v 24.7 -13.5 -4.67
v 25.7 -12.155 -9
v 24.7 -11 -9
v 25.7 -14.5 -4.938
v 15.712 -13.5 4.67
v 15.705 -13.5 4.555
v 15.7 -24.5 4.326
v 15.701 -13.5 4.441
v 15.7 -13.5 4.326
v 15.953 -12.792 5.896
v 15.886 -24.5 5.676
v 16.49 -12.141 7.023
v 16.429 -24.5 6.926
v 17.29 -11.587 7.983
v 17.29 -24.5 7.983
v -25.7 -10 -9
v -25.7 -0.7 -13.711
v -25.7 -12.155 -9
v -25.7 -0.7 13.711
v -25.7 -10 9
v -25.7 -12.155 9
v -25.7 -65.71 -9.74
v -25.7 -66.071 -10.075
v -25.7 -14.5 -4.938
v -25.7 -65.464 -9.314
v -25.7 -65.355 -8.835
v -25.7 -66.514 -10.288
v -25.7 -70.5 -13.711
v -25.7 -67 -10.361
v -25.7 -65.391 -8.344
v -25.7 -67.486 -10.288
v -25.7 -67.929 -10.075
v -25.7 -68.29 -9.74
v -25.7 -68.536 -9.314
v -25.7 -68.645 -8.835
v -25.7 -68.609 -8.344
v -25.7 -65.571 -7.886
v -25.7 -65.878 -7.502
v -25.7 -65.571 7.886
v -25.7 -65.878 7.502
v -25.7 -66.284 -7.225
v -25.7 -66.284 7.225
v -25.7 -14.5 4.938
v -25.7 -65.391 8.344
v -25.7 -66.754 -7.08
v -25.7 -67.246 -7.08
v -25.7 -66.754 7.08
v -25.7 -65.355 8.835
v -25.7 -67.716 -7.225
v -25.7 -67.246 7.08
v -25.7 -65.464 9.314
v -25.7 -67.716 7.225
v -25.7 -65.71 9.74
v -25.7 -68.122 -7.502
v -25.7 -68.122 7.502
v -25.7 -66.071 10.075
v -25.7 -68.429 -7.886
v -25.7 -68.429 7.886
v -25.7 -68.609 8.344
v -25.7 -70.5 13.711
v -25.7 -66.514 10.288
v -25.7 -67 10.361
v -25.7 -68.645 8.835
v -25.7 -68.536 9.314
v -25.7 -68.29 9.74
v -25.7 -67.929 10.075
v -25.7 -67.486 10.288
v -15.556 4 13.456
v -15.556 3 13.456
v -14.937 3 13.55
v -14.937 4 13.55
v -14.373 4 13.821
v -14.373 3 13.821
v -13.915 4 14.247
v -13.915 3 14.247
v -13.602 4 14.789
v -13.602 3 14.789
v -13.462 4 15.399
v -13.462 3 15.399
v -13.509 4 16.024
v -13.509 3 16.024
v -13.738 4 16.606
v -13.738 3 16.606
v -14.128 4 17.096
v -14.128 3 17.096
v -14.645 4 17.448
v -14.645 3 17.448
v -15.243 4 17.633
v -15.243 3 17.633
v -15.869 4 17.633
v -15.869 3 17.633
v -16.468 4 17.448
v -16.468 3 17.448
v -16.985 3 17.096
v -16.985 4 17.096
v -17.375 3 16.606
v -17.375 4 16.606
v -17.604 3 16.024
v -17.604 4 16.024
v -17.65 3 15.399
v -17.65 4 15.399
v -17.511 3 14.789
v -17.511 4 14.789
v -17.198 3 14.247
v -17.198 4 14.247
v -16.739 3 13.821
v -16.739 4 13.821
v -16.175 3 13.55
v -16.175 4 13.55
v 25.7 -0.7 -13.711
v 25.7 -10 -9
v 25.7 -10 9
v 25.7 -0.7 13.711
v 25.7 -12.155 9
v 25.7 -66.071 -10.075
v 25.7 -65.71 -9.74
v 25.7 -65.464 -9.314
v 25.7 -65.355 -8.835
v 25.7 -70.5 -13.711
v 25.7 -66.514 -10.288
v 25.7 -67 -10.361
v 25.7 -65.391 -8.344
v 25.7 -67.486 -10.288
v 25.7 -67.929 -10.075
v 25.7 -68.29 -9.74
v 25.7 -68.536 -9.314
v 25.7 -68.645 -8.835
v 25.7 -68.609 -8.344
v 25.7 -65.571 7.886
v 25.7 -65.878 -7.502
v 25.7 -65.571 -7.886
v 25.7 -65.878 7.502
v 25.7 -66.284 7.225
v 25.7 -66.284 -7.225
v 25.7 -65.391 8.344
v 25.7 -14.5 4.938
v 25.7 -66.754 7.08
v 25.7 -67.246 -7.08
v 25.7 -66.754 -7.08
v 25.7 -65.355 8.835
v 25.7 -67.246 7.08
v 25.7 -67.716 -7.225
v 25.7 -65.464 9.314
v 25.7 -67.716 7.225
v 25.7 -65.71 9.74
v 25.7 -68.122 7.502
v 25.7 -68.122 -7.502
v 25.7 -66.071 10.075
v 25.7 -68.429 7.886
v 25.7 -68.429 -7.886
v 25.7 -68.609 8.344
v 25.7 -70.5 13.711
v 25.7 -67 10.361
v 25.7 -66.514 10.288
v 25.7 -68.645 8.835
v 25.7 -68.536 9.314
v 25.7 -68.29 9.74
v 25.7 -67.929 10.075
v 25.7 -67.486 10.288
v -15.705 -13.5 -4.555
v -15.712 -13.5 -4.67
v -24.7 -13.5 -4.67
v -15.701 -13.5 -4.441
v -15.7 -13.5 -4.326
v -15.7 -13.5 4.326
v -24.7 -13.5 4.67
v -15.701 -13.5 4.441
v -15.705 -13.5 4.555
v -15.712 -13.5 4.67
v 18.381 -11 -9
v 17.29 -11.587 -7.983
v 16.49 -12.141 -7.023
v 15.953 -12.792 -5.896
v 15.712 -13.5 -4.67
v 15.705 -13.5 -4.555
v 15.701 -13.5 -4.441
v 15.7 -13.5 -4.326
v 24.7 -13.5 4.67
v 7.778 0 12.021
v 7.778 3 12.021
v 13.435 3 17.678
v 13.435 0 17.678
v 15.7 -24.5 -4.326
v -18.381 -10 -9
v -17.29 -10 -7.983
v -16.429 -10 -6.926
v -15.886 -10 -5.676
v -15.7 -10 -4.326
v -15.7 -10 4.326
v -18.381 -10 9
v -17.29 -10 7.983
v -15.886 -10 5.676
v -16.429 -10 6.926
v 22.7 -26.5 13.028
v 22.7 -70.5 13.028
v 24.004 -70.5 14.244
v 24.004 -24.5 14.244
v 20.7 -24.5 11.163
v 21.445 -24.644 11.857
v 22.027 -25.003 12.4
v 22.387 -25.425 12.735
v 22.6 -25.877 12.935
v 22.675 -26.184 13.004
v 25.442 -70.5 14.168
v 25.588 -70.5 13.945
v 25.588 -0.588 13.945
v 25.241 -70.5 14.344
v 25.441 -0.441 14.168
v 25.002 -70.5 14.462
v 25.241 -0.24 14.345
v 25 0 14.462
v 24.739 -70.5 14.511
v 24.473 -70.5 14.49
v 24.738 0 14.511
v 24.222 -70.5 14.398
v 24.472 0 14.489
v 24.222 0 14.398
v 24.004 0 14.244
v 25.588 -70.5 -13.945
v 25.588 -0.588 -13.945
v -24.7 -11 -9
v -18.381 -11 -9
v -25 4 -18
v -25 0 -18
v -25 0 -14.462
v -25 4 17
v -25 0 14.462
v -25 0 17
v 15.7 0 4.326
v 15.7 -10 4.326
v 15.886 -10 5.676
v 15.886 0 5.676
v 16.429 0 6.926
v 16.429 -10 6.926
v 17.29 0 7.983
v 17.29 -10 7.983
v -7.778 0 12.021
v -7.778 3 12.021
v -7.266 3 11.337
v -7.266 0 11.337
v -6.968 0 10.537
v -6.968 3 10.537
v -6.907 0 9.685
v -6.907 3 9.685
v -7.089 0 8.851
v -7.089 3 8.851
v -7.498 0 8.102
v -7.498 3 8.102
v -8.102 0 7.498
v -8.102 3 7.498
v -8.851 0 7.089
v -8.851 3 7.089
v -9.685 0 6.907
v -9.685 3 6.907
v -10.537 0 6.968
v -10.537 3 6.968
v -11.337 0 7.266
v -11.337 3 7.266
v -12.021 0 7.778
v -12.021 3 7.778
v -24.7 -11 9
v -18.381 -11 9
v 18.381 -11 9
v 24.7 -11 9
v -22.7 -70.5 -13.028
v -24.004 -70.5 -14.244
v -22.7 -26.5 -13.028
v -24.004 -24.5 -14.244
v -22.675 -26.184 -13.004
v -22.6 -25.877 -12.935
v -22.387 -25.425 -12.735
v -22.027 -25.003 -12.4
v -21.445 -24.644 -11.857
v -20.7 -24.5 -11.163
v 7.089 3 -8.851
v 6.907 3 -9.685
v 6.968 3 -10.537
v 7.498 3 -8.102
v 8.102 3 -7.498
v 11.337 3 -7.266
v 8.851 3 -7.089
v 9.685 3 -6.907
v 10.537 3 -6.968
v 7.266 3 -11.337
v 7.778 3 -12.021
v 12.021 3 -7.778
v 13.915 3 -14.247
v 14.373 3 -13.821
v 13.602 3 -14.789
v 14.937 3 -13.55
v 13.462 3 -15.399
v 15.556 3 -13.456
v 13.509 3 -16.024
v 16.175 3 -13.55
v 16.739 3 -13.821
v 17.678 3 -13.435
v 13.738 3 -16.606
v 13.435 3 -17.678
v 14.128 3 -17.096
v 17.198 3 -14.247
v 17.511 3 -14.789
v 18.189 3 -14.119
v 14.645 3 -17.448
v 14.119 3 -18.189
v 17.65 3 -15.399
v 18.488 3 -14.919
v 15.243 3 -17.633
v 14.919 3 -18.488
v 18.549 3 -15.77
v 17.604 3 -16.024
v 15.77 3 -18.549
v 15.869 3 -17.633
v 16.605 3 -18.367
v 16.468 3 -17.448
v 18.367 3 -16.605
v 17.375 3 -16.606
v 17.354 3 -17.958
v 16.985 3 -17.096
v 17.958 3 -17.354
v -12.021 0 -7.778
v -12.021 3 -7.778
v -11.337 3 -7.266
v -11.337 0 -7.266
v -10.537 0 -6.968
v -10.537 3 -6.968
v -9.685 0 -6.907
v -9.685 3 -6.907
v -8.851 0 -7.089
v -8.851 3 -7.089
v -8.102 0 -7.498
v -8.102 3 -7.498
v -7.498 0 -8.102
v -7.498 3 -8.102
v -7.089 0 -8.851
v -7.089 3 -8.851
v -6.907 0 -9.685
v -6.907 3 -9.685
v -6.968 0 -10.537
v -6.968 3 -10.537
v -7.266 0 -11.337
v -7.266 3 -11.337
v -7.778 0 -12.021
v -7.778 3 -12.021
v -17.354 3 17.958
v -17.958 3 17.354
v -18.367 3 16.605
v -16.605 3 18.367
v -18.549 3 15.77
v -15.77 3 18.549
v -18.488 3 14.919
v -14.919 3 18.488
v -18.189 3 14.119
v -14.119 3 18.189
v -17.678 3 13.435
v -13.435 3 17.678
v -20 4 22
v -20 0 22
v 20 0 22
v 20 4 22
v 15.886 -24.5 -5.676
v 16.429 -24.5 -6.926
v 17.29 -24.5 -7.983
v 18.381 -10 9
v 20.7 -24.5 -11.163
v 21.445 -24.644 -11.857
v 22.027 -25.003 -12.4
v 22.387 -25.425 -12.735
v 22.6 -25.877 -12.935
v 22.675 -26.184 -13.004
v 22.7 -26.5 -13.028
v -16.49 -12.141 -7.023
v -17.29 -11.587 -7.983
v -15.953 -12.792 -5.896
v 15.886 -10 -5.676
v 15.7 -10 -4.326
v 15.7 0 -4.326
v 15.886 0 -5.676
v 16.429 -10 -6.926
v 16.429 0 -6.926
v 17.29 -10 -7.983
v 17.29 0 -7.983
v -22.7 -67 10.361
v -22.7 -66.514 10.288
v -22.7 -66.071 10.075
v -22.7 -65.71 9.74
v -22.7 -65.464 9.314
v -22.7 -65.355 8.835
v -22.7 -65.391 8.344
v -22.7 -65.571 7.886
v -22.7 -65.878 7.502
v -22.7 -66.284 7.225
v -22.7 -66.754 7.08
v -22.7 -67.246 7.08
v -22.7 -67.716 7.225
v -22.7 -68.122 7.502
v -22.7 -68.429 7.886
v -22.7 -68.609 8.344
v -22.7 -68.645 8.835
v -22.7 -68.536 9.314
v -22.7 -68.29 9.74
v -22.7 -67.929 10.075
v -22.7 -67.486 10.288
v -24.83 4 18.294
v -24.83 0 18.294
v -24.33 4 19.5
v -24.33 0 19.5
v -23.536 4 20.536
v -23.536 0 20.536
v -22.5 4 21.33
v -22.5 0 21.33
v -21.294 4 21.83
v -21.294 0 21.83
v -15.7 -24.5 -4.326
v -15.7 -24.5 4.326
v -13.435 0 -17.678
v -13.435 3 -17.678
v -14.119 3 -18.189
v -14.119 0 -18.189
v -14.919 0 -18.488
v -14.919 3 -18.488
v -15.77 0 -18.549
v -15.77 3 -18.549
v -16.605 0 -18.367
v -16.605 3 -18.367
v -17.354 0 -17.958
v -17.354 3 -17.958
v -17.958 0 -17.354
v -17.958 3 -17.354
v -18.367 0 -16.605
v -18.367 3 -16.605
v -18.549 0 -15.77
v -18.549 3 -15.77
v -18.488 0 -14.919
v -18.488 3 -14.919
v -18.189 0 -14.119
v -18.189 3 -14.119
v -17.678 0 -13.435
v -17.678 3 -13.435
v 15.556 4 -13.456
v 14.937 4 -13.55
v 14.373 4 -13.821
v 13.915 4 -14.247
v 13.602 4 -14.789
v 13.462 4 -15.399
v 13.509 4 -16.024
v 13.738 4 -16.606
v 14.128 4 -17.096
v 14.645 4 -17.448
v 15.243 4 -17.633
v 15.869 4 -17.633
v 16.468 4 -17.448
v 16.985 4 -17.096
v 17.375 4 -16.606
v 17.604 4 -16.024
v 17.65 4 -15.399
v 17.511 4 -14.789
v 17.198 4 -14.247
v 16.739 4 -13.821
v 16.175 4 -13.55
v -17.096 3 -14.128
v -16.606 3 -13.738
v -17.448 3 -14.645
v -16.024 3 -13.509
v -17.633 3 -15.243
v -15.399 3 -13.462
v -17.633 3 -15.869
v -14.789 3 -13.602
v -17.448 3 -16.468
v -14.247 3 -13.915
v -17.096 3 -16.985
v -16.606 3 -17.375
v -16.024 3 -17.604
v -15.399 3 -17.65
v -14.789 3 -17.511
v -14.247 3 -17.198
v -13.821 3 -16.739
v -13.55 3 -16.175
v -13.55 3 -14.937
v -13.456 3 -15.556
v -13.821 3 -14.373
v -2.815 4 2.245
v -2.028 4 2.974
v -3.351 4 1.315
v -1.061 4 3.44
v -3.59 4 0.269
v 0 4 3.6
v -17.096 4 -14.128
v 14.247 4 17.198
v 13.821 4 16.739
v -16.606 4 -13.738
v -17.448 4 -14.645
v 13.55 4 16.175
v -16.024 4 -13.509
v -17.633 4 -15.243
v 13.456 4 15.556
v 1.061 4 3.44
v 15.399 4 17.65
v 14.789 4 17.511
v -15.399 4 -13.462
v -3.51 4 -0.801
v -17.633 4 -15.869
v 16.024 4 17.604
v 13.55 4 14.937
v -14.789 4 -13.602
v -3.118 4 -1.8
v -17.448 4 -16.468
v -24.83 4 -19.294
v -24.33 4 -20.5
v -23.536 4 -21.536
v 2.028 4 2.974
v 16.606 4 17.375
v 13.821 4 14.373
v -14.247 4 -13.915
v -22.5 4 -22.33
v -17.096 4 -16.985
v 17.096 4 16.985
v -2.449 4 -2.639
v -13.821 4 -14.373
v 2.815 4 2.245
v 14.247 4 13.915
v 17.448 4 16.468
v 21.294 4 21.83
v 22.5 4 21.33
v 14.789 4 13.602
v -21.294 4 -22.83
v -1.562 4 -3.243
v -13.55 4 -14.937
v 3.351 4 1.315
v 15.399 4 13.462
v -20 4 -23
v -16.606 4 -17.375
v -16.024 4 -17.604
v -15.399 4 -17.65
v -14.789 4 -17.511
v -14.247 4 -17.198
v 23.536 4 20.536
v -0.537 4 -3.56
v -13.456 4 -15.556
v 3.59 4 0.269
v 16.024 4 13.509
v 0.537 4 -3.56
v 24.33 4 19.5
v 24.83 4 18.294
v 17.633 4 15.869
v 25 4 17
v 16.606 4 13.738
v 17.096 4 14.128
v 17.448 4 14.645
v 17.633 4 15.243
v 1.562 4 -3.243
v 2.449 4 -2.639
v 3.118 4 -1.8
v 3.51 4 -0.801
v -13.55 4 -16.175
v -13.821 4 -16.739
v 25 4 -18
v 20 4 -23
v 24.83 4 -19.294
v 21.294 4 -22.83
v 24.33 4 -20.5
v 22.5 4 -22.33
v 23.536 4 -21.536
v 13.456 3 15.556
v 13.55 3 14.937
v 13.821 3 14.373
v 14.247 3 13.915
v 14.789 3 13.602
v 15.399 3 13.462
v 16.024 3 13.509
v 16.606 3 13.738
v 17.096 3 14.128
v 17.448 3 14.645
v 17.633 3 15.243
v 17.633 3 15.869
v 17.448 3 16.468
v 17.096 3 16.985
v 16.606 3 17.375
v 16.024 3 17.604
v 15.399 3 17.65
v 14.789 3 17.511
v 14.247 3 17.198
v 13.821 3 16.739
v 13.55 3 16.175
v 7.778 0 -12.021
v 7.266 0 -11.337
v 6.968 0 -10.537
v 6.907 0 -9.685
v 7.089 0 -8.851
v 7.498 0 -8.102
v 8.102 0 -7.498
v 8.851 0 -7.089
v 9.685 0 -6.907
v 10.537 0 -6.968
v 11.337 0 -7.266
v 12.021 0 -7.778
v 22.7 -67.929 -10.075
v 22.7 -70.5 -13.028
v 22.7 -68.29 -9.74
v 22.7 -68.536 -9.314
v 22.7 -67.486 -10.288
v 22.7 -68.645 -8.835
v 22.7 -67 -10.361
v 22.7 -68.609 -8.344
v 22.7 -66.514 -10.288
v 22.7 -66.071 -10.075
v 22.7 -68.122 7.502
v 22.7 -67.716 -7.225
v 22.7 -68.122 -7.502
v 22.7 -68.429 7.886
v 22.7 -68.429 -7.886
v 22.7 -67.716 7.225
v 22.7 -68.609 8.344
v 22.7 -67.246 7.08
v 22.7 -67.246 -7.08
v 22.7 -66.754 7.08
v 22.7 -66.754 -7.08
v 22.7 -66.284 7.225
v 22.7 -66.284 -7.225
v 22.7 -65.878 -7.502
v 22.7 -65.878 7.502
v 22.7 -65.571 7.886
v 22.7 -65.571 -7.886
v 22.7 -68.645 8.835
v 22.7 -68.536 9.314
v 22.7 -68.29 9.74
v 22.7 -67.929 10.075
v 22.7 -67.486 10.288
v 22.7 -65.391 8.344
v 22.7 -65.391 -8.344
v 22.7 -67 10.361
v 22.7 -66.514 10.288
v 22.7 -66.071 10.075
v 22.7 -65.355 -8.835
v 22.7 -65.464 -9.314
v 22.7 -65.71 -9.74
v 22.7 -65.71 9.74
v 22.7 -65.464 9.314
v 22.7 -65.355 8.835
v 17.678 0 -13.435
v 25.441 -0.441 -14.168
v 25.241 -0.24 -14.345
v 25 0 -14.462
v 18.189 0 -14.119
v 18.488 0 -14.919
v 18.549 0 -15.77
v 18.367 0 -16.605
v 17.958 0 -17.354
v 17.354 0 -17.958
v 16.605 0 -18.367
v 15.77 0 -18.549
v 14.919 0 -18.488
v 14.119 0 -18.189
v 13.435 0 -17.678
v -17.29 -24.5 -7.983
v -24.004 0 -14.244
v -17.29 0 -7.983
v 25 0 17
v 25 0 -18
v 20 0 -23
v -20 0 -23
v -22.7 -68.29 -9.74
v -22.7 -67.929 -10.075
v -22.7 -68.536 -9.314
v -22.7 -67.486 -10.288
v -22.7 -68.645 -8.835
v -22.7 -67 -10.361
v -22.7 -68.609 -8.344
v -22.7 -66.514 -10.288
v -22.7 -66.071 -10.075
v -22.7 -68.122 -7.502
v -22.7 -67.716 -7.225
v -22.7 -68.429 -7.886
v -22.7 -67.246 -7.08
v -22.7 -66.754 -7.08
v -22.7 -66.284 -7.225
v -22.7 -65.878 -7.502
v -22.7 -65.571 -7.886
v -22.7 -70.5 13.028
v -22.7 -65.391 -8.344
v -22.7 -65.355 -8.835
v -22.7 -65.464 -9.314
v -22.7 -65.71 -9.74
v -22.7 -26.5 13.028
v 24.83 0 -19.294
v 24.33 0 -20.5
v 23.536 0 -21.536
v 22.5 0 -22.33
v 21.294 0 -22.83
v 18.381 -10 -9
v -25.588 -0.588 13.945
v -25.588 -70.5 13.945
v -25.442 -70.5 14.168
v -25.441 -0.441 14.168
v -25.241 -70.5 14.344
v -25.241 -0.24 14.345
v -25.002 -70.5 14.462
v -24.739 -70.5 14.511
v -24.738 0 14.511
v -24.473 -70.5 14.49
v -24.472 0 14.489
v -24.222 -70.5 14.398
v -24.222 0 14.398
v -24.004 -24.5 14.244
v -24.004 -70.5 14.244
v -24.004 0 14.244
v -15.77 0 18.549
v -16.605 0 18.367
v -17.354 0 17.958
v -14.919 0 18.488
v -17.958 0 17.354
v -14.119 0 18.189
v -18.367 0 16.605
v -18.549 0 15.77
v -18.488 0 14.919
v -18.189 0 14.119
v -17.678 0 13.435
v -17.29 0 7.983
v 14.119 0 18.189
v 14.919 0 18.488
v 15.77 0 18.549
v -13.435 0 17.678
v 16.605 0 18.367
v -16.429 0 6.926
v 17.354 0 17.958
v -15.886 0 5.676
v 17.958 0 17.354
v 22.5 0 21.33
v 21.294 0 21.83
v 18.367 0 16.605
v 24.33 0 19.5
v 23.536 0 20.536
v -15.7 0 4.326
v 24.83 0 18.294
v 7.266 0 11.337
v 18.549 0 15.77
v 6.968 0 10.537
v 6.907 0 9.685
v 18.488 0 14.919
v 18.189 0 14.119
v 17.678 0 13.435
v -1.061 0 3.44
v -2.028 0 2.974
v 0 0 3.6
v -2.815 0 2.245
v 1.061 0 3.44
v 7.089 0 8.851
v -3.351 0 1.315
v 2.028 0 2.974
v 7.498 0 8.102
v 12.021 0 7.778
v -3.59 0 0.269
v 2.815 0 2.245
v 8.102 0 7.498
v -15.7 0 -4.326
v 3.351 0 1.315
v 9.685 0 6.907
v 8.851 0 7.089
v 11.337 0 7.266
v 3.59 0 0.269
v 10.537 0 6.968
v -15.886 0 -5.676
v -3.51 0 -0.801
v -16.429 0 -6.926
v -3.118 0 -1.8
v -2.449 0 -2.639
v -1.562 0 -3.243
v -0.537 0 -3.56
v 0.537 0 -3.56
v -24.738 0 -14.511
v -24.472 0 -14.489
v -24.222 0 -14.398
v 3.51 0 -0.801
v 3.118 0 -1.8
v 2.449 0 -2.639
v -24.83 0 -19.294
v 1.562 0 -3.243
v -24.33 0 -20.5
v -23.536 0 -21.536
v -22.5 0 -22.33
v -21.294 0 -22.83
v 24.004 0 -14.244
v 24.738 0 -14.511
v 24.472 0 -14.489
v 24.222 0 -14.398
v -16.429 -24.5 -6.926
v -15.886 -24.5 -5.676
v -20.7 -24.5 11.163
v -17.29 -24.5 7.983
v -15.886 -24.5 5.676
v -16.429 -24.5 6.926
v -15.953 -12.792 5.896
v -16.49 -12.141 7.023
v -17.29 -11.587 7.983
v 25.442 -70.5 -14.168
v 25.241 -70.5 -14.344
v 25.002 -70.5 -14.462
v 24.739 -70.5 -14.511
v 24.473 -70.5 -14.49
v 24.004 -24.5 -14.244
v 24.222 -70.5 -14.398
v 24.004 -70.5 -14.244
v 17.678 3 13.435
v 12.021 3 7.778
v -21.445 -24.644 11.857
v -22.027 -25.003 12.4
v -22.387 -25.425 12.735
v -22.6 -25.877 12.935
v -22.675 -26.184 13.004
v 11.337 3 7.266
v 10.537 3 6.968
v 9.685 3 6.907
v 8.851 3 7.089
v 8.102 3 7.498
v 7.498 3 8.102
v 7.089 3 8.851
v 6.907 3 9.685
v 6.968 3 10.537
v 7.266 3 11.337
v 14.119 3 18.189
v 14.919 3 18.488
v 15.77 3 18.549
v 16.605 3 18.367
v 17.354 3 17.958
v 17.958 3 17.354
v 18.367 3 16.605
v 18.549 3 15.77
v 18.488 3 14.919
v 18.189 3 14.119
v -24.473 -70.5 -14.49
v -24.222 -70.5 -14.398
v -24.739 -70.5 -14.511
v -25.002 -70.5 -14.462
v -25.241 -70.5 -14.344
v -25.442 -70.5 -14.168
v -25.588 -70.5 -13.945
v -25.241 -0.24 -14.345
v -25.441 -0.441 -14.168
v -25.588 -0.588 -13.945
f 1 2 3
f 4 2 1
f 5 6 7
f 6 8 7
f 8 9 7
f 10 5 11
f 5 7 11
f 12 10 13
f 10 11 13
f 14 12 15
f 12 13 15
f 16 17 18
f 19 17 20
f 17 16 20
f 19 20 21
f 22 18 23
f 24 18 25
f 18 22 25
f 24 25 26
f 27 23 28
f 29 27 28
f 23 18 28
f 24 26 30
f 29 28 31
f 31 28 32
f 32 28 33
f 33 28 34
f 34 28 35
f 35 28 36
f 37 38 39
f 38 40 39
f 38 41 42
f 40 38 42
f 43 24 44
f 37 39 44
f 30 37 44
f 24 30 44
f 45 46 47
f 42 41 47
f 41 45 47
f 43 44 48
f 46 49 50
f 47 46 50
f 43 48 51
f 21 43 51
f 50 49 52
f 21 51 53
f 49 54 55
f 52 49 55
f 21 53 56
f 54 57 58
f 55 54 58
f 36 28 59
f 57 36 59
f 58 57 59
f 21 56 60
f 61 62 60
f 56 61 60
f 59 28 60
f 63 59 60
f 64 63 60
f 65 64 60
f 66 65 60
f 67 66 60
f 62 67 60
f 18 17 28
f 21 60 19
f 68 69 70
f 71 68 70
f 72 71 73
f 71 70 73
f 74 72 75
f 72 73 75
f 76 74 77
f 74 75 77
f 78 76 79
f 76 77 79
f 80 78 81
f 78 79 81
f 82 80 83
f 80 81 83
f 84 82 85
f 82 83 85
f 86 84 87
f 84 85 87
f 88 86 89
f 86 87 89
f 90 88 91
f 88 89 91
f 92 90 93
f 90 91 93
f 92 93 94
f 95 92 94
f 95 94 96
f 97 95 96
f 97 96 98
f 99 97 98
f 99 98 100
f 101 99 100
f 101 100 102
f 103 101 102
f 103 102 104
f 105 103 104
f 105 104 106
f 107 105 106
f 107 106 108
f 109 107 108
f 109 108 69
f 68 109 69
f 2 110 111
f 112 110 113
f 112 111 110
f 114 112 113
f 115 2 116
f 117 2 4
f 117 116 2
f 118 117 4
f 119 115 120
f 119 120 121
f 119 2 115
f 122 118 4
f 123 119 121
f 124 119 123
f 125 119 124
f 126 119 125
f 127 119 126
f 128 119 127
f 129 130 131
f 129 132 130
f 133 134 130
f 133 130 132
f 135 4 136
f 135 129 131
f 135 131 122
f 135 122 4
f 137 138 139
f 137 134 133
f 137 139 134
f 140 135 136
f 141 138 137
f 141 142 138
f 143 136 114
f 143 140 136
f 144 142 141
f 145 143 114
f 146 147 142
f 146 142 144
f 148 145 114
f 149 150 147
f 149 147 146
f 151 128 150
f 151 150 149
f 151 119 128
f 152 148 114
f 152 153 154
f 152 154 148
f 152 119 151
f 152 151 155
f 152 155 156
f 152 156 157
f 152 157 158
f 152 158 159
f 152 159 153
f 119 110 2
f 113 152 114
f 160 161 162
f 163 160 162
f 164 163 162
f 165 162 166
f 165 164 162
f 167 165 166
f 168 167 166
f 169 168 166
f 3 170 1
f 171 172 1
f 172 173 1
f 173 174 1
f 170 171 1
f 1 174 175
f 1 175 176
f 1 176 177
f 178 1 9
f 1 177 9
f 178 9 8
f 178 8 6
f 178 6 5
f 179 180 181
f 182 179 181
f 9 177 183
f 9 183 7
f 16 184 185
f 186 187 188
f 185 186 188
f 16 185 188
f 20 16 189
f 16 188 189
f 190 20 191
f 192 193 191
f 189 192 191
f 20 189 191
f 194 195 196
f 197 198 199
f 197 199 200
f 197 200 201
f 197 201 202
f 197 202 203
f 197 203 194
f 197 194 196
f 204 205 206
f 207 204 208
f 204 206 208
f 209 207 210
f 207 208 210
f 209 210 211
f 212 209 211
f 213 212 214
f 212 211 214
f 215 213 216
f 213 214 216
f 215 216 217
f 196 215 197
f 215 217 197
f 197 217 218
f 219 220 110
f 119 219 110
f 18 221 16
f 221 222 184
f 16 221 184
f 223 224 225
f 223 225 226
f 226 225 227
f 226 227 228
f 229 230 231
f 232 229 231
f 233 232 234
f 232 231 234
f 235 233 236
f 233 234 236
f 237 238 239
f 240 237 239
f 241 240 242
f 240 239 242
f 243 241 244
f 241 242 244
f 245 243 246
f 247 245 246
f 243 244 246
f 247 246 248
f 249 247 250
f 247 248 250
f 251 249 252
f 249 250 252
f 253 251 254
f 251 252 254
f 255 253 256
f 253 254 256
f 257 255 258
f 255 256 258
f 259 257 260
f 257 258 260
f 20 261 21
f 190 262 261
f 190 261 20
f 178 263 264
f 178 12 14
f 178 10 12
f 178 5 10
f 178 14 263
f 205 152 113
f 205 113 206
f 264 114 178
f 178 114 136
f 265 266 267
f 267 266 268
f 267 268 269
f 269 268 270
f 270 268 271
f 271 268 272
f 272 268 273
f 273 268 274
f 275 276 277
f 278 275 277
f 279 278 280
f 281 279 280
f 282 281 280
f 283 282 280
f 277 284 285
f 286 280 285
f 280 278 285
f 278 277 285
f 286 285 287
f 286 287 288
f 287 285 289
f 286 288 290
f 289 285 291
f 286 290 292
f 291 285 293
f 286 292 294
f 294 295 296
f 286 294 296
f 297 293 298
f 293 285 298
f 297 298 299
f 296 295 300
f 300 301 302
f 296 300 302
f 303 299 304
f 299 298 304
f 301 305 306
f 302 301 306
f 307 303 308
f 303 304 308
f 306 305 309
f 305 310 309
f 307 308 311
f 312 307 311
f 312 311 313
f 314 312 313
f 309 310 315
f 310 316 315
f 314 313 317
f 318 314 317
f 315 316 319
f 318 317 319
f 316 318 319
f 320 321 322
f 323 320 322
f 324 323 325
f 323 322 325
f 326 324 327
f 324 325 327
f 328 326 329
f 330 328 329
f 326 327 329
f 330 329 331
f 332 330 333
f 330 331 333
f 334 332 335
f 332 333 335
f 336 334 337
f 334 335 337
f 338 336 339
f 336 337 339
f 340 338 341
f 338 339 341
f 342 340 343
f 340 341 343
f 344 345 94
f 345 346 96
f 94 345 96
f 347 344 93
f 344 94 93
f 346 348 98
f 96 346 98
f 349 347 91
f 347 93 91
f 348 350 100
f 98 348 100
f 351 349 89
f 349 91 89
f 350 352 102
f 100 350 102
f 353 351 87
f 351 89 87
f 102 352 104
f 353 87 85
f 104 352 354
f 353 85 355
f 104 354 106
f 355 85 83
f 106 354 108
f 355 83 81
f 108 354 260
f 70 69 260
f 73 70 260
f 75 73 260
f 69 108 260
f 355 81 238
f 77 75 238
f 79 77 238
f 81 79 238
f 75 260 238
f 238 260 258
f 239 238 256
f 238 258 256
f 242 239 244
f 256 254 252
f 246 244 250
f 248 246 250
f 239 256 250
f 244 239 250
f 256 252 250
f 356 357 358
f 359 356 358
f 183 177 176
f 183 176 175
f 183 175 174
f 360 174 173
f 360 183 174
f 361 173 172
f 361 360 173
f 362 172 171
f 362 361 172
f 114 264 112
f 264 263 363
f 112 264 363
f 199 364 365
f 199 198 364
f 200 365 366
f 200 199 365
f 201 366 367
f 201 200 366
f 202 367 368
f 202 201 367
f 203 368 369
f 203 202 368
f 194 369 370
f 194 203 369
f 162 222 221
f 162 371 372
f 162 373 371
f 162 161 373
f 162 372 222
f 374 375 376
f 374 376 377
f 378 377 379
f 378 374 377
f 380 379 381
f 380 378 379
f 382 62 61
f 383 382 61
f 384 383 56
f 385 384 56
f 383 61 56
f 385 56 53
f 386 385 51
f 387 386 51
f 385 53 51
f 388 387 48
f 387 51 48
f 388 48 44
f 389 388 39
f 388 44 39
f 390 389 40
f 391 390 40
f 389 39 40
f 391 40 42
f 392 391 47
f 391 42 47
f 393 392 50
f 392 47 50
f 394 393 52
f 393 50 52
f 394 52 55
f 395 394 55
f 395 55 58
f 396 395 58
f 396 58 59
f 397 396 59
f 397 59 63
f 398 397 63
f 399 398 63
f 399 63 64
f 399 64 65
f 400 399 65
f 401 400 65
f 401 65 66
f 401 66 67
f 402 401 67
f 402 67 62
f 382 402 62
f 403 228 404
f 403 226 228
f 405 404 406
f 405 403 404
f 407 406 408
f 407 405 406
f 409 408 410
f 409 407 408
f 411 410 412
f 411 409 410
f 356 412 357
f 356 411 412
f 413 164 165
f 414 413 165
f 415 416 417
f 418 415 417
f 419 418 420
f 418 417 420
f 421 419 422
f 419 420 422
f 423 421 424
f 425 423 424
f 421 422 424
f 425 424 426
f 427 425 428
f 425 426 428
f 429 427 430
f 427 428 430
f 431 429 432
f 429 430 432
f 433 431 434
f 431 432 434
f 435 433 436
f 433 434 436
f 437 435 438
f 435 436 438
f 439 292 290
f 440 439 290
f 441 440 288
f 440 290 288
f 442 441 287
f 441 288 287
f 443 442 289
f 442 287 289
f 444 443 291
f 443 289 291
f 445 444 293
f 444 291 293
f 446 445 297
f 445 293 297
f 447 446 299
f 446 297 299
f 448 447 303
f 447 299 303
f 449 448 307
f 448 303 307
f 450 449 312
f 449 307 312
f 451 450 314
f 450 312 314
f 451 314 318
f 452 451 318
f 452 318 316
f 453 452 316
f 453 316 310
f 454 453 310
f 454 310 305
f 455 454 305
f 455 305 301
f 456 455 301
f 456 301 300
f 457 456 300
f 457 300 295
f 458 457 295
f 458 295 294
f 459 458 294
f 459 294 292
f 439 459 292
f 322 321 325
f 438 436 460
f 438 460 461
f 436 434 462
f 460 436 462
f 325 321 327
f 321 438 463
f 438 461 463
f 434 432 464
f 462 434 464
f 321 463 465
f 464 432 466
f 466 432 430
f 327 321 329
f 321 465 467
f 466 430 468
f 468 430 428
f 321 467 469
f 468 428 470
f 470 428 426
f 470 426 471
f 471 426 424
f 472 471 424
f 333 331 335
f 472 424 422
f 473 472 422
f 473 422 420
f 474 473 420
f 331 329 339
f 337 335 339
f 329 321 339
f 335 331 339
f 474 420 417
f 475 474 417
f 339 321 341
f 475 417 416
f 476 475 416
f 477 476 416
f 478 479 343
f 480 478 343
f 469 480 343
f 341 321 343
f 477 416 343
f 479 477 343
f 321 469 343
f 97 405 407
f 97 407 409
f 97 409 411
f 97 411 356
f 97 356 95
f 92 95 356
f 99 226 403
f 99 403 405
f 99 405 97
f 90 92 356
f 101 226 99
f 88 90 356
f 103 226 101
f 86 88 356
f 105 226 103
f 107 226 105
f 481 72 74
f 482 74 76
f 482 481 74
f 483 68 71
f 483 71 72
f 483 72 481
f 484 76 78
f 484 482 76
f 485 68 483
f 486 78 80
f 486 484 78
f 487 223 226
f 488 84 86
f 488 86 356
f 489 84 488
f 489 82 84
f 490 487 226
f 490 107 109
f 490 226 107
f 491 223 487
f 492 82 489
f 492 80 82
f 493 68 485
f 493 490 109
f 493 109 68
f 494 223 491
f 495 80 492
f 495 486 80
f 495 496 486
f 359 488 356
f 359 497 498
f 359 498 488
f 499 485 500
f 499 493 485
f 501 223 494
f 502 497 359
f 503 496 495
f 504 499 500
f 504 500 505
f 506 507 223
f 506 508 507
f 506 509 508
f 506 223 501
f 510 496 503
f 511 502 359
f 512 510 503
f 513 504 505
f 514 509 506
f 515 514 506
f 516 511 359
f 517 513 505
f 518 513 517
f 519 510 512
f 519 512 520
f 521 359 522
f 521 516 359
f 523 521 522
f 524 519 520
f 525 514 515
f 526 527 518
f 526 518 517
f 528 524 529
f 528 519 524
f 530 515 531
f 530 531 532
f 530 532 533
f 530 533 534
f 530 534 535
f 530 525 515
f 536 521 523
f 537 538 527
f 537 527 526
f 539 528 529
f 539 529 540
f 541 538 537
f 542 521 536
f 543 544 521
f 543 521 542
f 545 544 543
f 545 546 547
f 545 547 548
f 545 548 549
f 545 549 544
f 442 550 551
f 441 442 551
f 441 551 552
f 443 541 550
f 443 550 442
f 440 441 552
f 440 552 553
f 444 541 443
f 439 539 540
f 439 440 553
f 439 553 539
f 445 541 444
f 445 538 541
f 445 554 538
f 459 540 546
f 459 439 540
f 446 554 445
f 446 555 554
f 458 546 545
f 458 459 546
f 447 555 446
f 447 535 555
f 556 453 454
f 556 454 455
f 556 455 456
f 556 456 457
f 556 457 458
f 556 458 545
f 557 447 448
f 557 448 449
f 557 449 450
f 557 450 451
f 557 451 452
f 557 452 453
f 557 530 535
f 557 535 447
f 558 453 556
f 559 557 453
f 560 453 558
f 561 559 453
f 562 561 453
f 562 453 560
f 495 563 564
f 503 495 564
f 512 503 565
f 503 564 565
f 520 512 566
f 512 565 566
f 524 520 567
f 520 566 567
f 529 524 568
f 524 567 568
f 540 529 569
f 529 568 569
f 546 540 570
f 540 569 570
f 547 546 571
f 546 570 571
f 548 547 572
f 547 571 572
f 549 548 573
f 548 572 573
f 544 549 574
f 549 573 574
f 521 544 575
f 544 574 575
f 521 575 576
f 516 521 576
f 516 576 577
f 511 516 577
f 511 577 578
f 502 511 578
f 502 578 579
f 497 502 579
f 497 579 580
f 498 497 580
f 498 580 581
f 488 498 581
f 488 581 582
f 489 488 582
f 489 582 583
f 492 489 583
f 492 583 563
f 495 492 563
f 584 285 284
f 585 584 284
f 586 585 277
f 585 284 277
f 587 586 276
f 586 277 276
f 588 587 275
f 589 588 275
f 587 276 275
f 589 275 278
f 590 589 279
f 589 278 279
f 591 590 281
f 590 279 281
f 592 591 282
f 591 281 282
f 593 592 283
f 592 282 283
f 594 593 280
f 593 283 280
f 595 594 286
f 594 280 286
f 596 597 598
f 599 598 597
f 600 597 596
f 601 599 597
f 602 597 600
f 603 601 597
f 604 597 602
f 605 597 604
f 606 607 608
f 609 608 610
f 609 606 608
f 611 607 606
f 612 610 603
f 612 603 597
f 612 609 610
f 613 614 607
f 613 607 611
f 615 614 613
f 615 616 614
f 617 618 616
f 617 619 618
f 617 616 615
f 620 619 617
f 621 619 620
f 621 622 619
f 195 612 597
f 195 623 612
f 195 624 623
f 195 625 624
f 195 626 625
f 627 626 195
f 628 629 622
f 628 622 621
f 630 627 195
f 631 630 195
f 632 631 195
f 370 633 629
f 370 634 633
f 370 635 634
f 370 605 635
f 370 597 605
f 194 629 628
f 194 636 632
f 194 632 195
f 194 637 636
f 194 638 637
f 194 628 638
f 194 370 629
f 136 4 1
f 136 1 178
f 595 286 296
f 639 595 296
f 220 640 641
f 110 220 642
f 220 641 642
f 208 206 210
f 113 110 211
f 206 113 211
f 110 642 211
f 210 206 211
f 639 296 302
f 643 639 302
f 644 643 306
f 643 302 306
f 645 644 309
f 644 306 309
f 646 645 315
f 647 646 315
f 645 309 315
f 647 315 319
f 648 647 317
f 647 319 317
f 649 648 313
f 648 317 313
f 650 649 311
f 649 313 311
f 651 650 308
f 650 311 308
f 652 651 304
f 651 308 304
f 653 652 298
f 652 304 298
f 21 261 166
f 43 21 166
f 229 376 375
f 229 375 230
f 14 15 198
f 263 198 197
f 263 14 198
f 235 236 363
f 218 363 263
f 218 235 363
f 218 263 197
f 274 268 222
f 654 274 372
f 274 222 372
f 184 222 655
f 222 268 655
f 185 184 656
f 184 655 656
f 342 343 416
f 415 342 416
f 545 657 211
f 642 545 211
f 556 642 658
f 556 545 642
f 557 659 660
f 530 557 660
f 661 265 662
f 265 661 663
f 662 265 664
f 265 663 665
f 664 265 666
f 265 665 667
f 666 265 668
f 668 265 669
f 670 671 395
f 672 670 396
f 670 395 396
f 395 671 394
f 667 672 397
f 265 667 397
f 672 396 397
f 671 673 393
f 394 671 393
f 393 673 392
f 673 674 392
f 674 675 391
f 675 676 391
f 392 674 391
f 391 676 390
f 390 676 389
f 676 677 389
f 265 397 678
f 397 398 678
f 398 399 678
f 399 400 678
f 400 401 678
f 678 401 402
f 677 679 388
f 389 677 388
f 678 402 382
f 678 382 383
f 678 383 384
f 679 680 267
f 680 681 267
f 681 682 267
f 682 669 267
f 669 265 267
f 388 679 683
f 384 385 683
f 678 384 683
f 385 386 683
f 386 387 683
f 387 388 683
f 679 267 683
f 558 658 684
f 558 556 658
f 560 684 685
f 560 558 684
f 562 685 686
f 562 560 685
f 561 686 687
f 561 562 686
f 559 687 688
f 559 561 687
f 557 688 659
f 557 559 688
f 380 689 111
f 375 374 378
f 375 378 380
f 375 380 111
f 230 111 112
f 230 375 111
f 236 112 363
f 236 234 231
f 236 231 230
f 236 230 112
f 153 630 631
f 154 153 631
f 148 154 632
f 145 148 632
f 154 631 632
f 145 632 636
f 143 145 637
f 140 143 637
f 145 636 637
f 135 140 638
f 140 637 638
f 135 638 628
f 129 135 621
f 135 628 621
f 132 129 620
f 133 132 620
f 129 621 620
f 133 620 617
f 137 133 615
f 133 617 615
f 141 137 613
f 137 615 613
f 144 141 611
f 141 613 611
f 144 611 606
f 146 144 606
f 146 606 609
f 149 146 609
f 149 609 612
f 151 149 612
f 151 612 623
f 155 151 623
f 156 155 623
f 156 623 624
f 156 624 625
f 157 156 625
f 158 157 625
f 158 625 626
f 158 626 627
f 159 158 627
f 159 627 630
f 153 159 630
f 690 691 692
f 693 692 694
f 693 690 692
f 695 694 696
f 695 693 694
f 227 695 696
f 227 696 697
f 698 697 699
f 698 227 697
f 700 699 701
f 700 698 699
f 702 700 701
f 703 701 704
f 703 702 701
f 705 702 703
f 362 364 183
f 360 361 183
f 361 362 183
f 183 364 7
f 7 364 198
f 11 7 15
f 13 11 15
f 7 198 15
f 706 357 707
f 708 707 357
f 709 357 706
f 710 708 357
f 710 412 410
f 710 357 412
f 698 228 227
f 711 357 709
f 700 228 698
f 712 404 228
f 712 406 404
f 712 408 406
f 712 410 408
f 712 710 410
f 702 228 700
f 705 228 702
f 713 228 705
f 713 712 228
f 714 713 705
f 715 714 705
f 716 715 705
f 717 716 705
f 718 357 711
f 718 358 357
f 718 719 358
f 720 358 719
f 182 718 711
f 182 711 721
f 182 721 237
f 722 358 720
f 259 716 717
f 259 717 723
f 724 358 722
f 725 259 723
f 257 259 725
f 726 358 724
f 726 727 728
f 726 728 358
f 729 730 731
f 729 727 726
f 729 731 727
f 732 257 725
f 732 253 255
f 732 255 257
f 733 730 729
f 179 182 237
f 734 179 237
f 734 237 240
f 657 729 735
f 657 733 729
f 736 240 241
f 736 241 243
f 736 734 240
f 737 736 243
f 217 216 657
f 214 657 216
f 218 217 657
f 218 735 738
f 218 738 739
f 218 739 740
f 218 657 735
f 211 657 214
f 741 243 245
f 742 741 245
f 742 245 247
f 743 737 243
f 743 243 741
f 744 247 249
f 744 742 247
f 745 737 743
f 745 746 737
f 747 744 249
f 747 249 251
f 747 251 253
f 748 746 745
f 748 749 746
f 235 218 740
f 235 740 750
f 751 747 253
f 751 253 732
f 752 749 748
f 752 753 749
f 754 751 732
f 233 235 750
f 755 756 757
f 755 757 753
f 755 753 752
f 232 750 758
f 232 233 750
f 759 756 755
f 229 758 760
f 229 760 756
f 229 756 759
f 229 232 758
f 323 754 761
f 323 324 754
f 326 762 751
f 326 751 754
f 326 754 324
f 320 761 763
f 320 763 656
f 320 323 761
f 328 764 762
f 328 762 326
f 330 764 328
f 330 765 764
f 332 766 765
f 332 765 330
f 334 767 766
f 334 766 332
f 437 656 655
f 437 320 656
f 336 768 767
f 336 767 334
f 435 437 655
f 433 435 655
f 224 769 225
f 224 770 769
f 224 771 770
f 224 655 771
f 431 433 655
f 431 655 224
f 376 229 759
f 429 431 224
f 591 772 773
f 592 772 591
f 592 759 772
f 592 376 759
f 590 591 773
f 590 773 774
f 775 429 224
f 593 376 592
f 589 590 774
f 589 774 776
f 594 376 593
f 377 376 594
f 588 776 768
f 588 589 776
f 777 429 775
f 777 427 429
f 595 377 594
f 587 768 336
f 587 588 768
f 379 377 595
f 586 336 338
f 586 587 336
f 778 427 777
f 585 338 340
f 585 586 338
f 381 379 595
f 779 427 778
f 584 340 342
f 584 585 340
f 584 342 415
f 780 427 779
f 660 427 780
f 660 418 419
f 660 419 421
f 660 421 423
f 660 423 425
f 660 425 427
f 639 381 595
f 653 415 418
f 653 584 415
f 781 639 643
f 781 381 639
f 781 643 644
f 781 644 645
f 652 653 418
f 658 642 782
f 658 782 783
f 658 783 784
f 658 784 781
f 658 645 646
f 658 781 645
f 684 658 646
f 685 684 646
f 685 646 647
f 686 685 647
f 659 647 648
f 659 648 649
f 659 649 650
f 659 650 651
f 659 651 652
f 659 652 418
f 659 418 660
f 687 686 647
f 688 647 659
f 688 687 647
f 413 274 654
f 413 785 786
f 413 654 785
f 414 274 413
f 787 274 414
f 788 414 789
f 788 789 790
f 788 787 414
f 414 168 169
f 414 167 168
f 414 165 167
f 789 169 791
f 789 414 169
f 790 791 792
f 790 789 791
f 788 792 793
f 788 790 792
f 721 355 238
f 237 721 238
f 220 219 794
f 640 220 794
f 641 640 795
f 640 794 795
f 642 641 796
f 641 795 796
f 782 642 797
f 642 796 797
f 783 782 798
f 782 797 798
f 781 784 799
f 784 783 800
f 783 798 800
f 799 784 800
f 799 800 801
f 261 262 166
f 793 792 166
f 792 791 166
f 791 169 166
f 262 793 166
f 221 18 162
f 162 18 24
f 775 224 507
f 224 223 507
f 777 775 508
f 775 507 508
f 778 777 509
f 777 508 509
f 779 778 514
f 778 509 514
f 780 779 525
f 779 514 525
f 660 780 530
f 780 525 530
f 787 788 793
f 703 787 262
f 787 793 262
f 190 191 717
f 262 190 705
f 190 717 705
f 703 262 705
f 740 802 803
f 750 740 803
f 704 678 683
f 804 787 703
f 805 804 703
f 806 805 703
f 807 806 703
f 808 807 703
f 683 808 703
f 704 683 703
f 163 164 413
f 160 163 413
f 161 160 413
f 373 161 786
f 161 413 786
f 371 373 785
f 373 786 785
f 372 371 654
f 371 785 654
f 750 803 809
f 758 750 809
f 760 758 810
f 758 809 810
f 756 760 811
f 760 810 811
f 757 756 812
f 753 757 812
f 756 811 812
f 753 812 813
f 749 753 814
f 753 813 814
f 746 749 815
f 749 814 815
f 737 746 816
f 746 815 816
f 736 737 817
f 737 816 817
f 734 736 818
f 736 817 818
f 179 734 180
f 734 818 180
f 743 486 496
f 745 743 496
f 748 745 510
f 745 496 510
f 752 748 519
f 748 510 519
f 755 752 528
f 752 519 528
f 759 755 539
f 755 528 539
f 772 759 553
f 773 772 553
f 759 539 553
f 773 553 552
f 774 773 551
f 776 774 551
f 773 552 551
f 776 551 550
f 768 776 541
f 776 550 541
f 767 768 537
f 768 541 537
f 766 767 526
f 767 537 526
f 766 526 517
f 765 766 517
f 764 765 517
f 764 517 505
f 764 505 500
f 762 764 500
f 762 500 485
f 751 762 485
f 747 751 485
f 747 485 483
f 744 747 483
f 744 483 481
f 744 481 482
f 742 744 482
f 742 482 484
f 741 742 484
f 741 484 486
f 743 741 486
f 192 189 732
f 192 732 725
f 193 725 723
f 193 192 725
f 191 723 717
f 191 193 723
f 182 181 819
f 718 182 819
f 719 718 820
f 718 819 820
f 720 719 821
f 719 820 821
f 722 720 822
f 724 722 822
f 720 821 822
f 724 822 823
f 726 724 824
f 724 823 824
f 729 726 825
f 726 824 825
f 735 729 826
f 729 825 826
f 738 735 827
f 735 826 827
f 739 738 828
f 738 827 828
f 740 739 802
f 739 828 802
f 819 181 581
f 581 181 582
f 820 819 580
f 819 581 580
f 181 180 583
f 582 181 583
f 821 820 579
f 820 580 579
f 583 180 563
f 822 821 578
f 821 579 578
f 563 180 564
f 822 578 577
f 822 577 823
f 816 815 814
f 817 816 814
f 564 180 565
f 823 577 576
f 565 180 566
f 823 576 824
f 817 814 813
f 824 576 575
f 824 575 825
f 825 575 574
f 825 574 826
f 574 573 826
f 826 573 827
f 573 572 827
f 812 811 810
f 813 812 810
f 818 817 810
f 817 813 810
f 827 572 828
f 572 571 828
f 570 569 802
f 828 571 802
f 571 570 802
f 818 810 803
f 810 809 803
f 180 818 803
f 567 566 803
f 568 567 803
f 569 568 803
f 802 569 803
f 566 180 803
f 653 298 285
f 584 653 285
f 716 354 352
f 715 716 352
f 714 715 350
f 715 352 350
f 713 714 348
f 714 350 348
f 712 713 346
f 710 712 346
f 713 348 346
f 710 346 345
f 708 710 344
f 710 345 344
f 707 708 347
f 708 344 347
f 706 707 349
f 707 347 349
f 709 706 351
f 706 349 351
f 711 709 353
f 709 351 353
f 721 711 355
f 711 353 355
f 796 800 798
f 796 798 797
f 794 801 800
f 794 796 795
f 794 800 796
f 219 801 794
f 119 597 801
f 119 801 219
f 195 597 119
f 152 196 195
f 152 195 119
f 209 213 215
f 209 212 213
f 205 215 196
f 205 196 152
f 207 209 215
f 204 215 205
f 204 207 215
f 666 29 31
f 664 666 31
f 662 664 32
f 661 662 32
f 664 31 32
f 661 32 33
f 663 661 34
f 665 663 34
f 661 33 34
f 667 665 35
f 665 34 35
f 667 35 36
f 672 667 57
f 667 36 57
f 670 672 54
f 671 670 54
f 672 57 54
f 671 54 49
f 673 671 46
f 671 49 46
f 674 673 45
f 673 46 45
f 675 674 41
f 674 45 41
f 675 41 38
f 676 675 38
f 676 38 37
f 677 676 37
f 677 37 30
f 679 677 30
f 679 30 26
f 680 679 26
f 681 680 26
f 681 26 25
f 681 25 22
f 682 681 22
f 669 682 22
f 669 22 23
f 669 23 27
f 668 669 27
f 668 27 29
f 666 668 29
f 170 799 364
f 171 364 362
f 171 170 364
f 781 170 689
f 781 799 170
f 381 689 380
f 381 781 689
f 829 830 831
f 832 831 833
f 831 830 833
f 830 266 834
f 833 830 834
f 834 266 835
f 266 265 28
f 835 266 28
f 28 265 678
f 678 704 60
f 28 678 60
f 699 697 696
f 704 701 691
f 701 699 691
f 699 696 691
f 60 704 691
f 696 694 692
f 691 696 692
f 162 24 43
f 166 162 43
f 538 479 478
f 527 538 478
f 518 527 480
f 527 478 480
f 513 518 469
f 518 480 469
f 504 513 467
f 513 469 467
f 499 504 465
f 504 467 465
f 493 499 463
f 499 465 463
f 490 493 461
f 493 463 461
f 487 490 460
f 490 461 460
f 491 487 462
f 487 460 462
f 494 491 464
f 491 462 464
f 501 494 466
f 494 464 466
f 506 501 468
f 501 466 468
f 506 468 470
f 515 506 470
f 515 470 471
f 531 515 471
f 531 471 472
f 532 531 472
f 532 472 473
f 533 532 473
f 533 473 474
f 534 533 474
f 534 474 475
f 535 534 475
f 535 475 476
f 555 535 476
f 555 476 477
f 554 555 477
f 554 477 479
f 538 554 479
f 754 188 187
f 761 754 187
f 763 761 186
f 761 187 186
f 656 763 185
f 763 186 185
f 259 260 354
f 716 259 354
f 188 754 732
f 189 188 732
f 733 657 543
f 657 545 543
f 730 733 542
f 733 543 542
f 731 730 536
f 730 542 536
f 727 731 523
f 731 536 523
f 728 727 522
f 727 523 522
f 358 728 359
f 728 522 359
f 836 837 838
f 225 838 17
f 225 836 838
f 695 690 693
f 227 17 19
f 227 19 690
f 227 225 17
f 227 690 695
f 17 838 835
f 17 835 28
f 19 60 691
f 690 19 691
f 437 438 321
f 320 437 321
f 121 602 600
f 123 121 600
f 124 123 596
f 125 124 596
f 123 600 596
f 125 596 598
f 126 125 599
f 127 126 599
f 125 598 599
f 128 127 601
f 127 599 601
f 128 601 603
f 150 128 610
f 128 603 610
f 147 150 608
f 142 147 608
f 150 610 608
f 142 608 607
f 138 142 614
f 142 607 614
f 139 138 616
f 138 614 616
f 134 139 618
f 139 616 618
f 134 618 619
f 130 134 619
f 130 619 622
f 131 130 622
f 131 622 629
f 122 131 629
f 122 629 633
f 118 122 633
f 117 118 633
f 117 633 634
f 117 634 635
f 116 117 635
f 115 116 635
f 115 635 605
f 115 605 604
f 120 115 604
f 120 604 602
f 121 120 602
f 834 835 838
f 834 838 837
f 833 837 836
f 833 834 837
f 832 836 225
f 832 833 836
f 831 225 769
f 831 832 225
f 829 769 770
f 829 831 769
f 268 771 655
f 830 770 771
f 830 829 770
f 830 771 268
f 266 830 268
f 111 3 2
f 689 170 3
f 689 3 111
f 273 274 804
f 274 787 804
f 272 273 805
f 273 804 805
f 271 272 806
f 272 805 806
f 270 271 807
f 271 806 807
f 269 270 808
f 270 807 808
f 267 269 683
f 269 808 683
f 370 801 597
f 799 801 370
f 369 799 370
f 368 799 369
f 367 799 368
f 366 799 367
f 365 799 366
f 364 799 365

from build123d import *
from OCP.BRepFilletAPI import BRepFilletAPI_MakeChamfer

# Parameters (mm, degrees)
DODANIE_WYCI_GNI_CIE2_DEPTH = 4
WYTNIJ_WYCI_GNI_CIE3_START  = -1
WYTNIJ_WYCI_GNI_CIE3_DEPTH  = 34.205262753
SZKIC6_3_R                  = 3.6
WYTNIJ_WYCI_GNI_CIE4_DEPTH  = 35.205262753
DODANIE_WYCI_GNI_CIE3_DEPTH = 24.5
DODANIE_WYCI_GNI_CIE4_DEPTH = 46
DODANIE_WYCI_GNI_CIE5_DEPTH = 70.5
SFAZOWANIE3_SIZE            = 0.7
ZAOKR_GLENIE1_R             = 1
ZAOKR_GLENIE2_R             = 5
WYTNIJ_WYCI_GNI_CIE1_REACH  = 86.592
SZKIC3_W                    = 18
SZKIC3_H                    = 3.5
SFAZOWANIE1_SIZE            = 2.5
SFAZOWANIE1_SIZE2           = 4.330127019
ZAOKR_GLENIE4_R             = 2
SFAZOWANIE2_SIZE            = 1
ZAOKR_GLENIE3_R             = 5
SZKIC10_R                   = 2.1
WYTNIJ_WYCI_GNI_CIE5_DEPTH  = 82.189531345
SZYK_KO_OWY1_COUNT          = 4
SZKIC12_R                   = 1.65
WYTNIJ_WYCI_GNI_CIE6_DEPTH  = 91.228653985


# Read off the part's stored shape, not the designer's step: Lustro1
# Some blends are built 0.0001 mm under size
with BuildPart() as part:
    # Szkic1 → Dodanie-wyciągnięcie2 (new body)
    with BuildSketch(Plane(origin=(0, 0, 0), x_dir=(1, 0, 0), z_dir=(0, 1, 0))):
        Polygon((-25, -21), (-25, -22), (25, -22), (25, -21), (25, 23), (-25, 23), align=None)
    extrude(amount=DODANIE_WYCI_GNI_CIE2_DEPTH)

    # Szkic6 → Wytnij-wyciągnięcie3 (cut, through all)
    with BuildSketch(Plane(origin=(0, 4, 0), x_dir=(1, 0, 0), z_dir=(0, 1, 0)).offset(WYTNIJ_WYCI_GNI_CIE3_START)):
        with BuildLine():
            Line((-12.02081528, -7.778174593), (-17.67766953, -13.435028843))
            ThreePointArc((-17.67766953, -13.435028843), (-17.67766953, -17.67766953), (-13.435028843, -17.67766953))
            Line((-13.435028843, -17.67766953), (-7.778174593, -12.02081528))
            ThreePointArc((-7.778174593, -12.02081528), (-7.778174593, -7.778174593), (-12.02081528, -7.778174593))
        make_face()
        with BuildLine():
            Line((-7.778174593, 12.02081528), (-13.435028843, 17.67766953))
            ThreePointArc((-13.435028843, 17.67766953), (-17.67766953, 17.67766953), (-17.67766953, 13.435028843))
            Line((-17.67766953, 13.435028843), (-12.02081528, 7.778174593))
            ThreePointArc((-12.02081528, 7.778174593), (-7.778174593, 7.778174593), (-7.778174593, 12.02081528))
        make_face()
        with BuildLine():
            Line((12.02081528, 7.778174593), (17.67766953, 13.435028843))
            ThreePointArc((17.67766953, 13.435028843), (17.67766953, 17.67766953), (13.435028843, 17.67766953))
            Line((13.435028843, 17.67766953), (7.778174593, 12.02081528))
            ThreePointArc((7.778174593, 12.02081528), (7.778174593, 7.778174593), (12.02081528, 7.778174593))
        make_face()
        with BuildLine():
            Line((7.778174593, -12.02081528), (13.435028843, -17.67766953))
            ThreePointArc((13.435028843, -17.67766953), (17.67766953, -17.67766953), (17.67766953, -13.435028843))
            Line((17.67766953, -13.435028843), (12.02081528, -7.778174593))
            ThreePointArc((12.02081528, -7.778174593), (7.778174593, -7.778174593), (7.778174593, -12.02081528))
        make_face()
    extrude(amount=-WYTNIJ_WYCI_GNI_CIE3_DEPTH, mode=Mode.SUBTRACT)

    # Szkic6<3> → Wytnij-wyciągnięcie4 (cut, through all)
    with BuildSketch(Plane(origin=(0, 4, 0), x_dir=(1, 0, 0), z_dir=(0, 1, 0))):
        with Locations(Location((0, 0, 0), (0, 0, 270))):
            Circle(SZKIC6_3_R)
    extrude(amount=-WYTNIJ_WYCI_GNI_CIE4_DEPTH, mode=Mode.SUBTRACT)

    # Szkic2 → Dodanie-wyciągnięcie3 (add)
    with BuildSketch(Plane.XZ):
        Polygon((15.7, -6.5), (15.7, 6.5), (25, 15.172390301), (25, -15.172390301), align=None)
    extrude(amount=DODANIE_WYCI_GNI_CIE3_DEPTH)

    # Szkic8 → Dodanie-wyciągnięcie4 (add)
    with BuildSketch(Plane.XZ.offset(24.5)):
        Polygon((25, 15.172390301), (25, -15.172390301), (22.7, -13.027605603), (22.7, 13.027605603), align=None)
    extrude(amount=DODANIE_WYCI_GNI_CIE4_DEPTH)

    # Szkic11 → Dodanie-wyciągnięcie5 (add)
    with BuildSketch(Plane.XZ.offset(70.5)):
        Polygon((25, 15.172390301), (25, -15.172390301), (25.7, -13.711437924), (25.7, 13.711439266), align=None)
    extrude(amount=-DODANIE_WYCI_GNI_CIE5_DEPTH)

    # Sfazowanie3
    sfazowanie3_edges = [part.edges().sort_by_distance(p)[0] for p in [
        (25.7, 0, 6.71e-07),
    ]]
    chamfer(sfazowanie3_edges, length=SFAZOWANIE3_SIZE - 0.0001)  # a hair under: the kernel refuses the full size

    # Zaokrąglenie1
    # the kernel refuses this fillet: 1 mm, written as the material it takes off along each edge
    with BuildSketch(Plane(origin=(25, 0, 15.172390301), x_dir=(0.4321005826211705, 0, -0.9018254190797934), z_dir=(0, -1, 0))) as zaokr_glenie1_piece_1:
        with BuildLine():
            CenterArc((ZAOKR_GLENIE1_R * 1.36131157072, -ZAOKR_GLENIE1_R), ZAOKR_GLENIE1_R, 90, 107.399057565)
            Line((ZAOKR_GLENIE1_R * 0.407066323534, -ZAOKR_GLENIE1_R * 1.2990250963), (0, 0))
            Line((0, 0), (ZAOKR_GLENIE1_R * 1.36131157072, 0))
        make_face()
    extrude(amount=73.903278927, mode=Mode.SUBTRACT)
    with BuildSketch(Plane(origin=(25, -73.903280204, -15.172390301), x_dir=(0.43210025968346966, 0, 0.901825573812075), z_dir=(0, 1, 0))) as zaokr_glenie1_piece_2:
        with BuildLine():
            CenterArc((ZAOKR_GLENIE1_R * 1.36131208157, -ZAOKR_GLENIE1_R), ZAOKR_GLENIE1_R, 90, 107.399078082)
            Line((ZAOKR_GLENIE1_R * 0.407066941463, -ZAOKR_GLENIE1_R * 1.29902543801), (0, 0))
            Line((0, 0), (ZAOKR_GLENIE1_R * 1.36131208157, 0))
        make_face()
    extrude(amount=73.903280204, mode=Mode.SUBTRACT)

    # Zaokrąglenie2
    zaokr_glenie2_edges = [part.edges().sort_by_distance(p)[0] for p in [
        (15.7, -12.25, 6.5),
        (15.7, -12.25, -6.5),
    ]]
    fillet(zaokr_glenie2_edges, radius=ZAOKR_GLENIE2_R)

    # Szkic3 → Wytnij-wyciągnięcie1 (cut, up to next)
    with BuildSketch(Plane.ZY.offset(-15.7), mode=Mode.PRIVATE) as wytnij_wyci_gni_cie1_sk1:
        with Locations((0, -11.75)):
            Rectangle(SZKIC3_W, SZKIC3_H)
    wytnij_wyci_gni_cie1_tool1 = extrude(wytnij_wyci_gni_cie1_sk1.sketch, amount=-WYTNIJ_WYCI_GNI_CIE1_REACH, mode=Mode.PRIVATE) & part.part
    add(wytnij_wyci_gni_cie1_tool1.solids().sort_by_distance((15.7, -11.75, 0))[0], mode=Mode.SUBTRACT)

    # Sfazowanie1: one chamfer whose edges measure the first distance from different faces: ONE call of the kernel's chamfer builder (chamfer() names one face for all edges)
    sfazowanie1_edges_1 = [part.edges().sort_by_distance(p)[0] for p in [
        (22.040460888, -13.5, -9),
    ]]
    sfazowanie1_side_1 = [part.faces().sort_by_distance(p)[0] for p in [
        (22.040460888, -11.75, -9),
    ]]
    sfazowanie1_edges_2 = [part.edges().sort_by_distance(p)[0] for p in [
        (22.040460888, -13.5, 9),
    ]]
    sfazowanie1_side_2 = [part.faces().sort_by_distance(p)[0] for p in [
        (22.040460888, -11.75, 9),
    ]]
    sfazowanie1 = BRepFilletAPI_MakeChamfer(part.part.solid().wrapped)
    for e in sfazowanie1_edges_1:
        sfazowanie1.Add(SFAZOWANIE1_SIZE, SFAZOWANIE1_SIZE2, e.wrapped, sfazowanie1_side_1[0].wrapped)  # the first distance lies on this face
    for e in sfazowanie1_edges_2:
        sfazowanie1.Add(SFAZOWANIE1_SIZE, SFAZOWANIE1_SIZE2, e.wrapped, sfazowanie1_side_2[0].wrapped)  # the first distance lies on this face
    add(Compound.cast(sfazowanie1.Shape()), mode=Mode.REPLACE)

    # Zaokrąglenie4
    zaokr_glenie4_edges = [part.edges().sort_by_distance(p)[0] for p in [
        (22.7, -24.5, 0),
    ]]
    fillet(zaokr_glenie4_edges, radius=ZAOKR_GLENIE4_R)

    # Lustro1: part across plane


with BuildPart() as part_1:
    add(part.part)
    add(part.part.mirror(Plane(origin=(0, 0, 0), x_dir=(0, 0, 1), z_dir=(1, 0, 0))))

    # Sfazowanie2
    sfazowanie2_edges = [part_1.edges().sort_by_distance(p)[0] for p in [
        (25.7, -13.5, 0),
        (25.7, -12.25, -6.834936491),
        (25.7, -12.25, 6.834936491),
        (-25.7, -13.5, 0),
        (-25.7, -12.25, -6.834936491),
        (-25.7, -12.25, 6.834936491),
    ]]
    chamfer(sfazowanie2_edges, length=SFAZOWANIE2_SIZE)

    # Zaokrąglenie3
    zaokr_glenie3_edges = [part_1.edges().sort_by_distance(p)[0] for p in [
        (25, 2, 22),
        (-25, 2, 22),
        (-25, 2, -23),
        (25, 2, -23),
    ]]
    fillet(zaokr_glenie3_edges, radius=ZAOKR_GLENIE3_R)

    # Szkic10 → Wytnij-wyciągnięcie5 (cut, through all)
    with BuildSketch(Plane.XZ.offset(-3)):
        with Locations(Location((-15.556349186, 15.556349186, 0), (0, 0, 270))):
            Circle(SZKIC10_R)
    wytnij_wyci_gni_cie5 = extrude(amount=-WYTNIJ_WYCI_GNI_CIE5_DEPTH, mode=Mode.SUBTRACT)

    # Szyk kołowy1: Wytnij-wyciągnięcie5 ×4 about axis
    szyk_ko_owy1_axis = Axis((0, 0, 0), (0, 1, 0))
    for i in range(1, SZYK_KO_OWY1_COUNT):
        add(wytnij_wyci_gni_cie5.rotate(szyk_ko_owy1_axis, i * 360 / SZYK_KO_OWY1_COUNT), mode=Mode.SUBTRACT)

    # Szkic12 → Wytnij-wyciągnięcie6 (cut, through all)
    with BuildSketch(Plane.ZY.offset(25.7)):
        with Locations((8.711439266, -67)):
            Circle(SZKIC12_R)
        with Locations(Location((-8.711439266, -67, 0), (0, 0, 180))):
            Circle(SZKIC12_R)
    extrude(amount=-WYTNIJ_WYCI_GNI_CIE6_DEPTH, mode=Mode.SUBTRACT)


solid = part_1.part
